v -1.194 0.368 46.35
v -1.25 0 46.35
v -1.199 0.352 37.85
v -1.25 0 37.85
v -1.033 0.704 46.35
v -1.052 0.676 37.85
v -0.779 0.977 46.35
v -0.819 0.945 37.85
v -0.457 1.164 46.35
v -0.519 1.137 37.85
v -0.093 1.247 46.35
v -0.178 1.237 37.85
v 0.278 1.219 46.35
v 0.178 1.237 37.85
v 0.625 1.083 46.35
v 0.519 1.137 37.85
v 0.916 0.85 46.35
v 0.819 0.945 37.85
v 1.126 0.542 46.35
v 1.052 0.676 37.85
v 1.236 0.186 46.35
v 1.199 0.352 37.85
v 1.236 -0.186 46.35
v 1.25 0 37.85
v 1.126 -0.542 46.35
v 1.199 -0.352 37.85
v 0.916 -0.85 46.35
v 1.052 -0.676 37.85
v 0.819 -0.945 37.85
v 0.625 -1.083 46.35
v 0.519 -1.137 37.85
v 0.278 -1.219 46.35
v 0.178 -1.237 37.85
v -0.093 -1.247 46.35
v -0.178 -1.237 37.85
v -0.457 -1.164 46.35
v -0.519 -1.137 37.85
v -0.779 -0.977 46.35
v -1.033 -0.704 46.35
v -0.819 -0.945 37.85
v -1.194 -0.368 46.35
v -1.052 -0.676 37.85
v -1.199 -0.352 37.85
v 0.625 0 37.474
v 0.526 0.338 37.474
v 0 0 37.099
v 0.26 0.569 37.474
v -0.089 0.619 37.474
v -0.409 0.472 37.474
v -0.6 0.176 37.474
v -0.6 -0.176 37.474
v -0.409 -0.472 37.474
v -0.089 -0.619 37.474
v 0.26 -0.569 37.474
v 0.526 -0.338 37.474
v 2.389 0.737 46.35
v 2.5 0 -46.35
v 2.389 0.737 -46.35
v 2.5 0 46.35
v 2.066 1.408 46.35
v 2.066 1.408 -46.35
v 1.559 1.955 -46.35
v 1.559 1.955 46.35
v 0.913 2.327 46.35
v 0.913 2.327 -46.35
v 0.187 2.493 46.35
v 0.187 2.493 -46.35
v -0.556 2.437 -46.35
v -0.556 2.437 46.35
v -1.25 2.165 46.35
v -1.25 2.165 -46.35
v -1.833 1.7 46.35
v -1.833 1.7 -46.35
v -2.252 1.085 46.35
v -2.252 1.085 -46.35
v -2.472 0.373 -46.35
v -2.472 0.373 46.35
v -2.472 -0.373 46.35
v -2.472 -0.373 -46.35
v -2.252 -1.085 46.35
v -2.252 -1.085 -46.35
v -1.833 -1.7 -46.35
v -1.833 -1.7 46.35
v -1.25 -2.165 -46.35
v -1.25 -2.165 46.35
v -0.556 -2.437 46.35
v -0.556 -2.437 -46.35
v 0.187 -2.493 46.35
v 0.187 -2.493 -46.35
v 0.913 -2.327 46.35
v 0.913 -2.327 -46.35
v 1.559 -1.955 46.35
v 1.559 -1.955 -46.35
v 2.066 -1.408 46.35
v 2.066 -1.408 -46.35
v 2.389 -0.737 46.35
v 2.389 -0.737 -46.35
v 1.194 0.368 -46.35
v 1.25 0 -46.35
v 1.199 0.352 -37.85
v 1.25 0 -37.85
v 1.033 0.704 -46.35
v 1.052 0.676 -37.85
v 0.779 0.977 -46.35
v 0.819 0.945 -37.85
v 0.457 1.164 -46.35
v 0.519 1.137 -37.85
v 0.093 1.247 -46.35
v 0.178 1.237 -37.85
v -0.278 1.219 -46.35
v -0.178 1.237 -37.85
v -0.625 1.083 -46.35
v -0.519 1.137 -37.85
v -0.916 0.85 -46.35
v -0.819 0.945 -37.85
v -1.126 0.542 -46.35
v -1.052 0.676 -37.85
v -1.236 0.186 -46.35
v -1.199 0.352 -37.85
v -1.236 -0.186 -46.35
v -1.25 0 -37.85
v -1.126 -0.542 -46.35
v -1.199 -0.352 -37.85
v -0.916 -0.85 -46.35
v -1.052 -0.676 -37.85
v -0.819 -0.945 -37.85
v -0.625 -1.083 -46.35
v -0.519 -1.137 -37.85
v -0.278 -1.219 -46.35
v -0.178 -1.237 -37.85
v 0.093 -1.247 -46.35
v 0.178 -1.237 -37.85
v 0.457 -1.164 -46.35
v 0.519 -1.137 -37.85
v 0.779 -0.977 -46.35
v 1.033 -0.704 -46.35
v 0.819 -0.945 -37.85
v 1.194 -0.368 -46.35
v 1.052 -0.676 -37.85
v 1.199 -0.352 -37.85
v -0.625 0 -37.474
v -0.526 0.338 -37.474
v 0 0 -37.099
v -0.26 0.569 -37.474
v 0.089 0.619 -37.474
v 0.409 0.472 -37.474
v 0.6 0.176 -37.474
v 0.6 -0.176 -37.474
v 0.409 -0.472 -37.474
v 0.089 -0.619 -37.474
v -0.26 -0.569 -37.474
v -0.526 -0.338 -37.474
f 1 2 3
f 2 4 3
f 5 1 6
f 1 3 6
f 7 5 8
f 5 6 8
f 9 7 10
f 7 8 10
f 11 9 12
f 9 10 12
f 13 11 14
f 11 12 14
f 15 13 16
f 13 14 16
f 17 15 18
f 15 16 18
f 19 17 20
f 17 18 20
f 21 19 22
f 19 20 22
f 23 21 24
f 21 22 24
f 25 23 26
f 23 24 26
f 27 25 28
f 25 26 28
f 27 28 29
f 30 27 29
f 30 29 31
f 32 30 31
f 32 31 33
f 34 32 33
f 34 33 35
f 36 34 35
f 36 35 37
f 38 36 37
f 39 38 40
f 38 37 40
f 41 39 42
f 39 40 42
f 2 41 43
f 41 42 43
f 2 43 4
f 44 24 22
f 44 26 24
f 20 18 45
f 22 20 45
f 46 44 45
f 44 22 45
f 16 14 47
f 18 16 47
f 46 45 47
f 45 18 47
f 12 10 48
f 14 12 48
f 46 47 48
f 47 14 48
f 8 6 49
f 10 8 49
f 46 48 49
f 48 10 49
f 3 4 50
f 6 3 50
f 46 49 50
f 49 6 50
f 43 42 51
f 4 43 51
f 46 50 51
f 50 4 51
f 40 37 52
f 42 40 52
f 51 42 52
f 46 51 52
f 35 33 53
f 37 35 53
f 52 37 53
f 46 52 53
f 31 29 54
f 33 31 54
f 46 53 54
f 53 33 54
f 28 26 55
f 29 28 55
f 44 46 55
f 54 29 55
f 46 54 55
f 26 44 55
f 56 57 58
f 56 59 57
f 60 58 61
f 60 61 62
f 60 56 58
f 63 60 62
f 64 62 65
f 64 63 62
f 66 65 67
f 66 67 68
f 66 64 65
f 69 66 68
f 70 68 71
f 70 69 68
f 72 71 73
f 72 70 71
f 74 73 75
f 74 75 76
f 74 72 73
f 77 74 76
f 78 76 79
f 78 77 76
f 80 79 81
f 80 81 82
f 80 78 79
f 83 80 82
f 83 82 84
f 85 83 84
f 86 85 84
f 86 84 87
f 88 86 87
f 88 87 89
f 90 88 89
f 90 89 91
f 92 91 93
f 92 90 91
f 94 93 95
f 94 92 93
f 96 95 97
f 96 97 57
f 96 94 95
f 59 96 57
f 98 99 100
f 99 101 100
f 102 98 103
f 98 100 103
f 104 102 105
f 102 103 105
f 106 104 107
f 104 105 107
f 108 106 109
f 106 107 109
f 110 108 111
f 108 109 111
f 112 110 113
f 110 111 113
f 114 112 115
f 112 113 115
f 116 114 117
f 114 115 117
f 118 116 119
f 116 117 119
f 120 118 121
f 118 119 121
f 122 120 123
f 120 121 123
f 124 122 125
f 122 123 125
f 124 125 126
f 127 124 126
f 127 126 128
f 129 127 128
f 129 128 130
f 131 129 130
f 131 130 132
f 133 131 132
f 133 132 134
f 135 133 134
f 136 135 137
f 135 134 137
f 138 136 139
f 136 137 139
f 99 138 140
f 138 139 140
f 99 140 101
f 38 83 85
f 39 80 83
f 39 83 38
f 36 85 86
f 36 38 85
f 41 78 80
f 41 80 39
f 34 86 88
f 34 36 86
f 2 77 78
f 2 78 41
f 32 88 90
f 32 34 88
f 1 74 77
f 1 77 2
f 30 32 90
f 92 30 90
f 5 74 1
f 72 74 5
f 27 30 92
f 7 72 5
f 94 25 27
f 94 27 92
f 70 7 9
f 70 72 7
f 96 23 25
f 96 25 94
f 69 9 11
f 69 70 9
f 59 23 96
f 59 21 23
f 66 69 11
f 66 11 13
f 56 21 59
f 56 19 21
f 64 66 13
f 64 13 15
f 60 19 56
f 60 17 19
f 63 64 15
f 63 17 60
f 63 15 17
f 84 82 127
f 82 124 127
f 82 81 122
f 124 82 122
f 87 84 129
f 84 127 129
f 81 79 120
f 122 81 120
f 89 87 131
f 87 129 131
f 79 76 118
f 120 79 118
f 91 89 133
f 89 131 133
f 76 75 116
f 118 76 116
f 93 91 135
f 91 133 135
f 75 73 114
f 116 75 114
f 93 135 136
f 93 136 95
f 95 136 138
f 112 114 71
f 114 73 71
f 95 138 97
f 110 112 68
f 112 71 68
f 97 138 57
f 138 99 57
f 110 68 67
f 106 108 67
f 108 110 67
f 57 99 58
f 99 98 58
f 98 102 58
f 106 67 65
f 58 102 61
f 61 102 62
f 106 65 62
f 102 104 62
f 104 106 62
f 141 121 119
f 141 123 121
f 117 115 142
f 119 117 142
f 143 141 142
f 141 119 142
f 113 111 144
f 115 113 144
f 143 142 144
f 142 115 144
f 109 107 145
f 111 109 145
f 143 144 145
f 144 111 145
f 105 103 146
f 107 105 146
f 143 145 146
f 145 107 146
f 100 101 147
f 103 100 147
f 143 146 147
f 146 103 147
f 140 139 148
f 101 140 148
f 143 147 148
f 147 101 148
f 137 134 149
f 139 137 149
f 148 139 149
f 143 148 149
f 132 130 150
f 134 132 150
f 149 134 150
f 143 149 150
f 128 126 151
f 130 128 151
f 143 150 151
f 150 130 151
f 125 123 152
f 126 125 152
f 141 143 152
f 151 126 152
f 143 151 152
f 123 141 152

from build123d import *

# Parameters (mm, degrees)
SKETCH_1_R               = 2.5
EXTRUDE_1_DEPTH          = 46.35
M3X0_5_1_D               = 2.5
M3X0_5_1_DEPTH           = 8.5
M3X0_5_1_TIP             = 0.751075774
M3X0_5_1_ON_FACE_2_D     = 2.5
M3X0_5_1_ON_FACE_2_DEPTH = 8.5
M3X0_5_1_ON_FACE_2_TIP   = 0.751075774


with BuildPart() as part:
    # ｽｹｯﾁ1 → ﾎﾞｽ - 押し出し1 (new body, symmetric)
    with BuildSketch(Plane.XY):
        Circle(SKETCH_1_R)
    extrude(amount=EXTRUDE_1_DEPTH, both=True)

    # M3x0.5 ねじ穴1
    with Locations(Plane.XY.offset(46.35)):
        with Locations((0, 0)):
            Hole(M3X0_5_1_D / 2, depth=M3X0_5_1_DEPTH)
            with Locations((0, 0, -(M3X0_5_1_DEPTH + M3X0_5_1_TIP / 2))):  # 118° drill point
                Cone(0, M3X0_5_1_D / 2, M3X0_5_1_TIP, mode=Mode.SUBTRACT)

    # M3x0.5 ねじ穴1 on face 2
    with Locations(Plane(origin=(0, 0, -46.35), x_dir=(-1, 0, 0), z_dir=(0, 0, -1))):
        with Locations((0, 0)):
            Hole(M3X0_5_1_ON_FACE_2_D / 2, depth=M3X0_5_1_ON_FACE_2_DEPTH)
            with Locations((0, 0, -(M3X0_5_1_ON_FACE_2_DEPTH + M3X0_5_1_ON_FACE_2_TIP / 2))):  # 118° drill point
                Cone(0, M3X0_5_1_ON_FACE_2_D / 2, M3X0_5_1_ON_FACE_2_TIP, mode=Mode.SUBTRACT)


solid = part.part
